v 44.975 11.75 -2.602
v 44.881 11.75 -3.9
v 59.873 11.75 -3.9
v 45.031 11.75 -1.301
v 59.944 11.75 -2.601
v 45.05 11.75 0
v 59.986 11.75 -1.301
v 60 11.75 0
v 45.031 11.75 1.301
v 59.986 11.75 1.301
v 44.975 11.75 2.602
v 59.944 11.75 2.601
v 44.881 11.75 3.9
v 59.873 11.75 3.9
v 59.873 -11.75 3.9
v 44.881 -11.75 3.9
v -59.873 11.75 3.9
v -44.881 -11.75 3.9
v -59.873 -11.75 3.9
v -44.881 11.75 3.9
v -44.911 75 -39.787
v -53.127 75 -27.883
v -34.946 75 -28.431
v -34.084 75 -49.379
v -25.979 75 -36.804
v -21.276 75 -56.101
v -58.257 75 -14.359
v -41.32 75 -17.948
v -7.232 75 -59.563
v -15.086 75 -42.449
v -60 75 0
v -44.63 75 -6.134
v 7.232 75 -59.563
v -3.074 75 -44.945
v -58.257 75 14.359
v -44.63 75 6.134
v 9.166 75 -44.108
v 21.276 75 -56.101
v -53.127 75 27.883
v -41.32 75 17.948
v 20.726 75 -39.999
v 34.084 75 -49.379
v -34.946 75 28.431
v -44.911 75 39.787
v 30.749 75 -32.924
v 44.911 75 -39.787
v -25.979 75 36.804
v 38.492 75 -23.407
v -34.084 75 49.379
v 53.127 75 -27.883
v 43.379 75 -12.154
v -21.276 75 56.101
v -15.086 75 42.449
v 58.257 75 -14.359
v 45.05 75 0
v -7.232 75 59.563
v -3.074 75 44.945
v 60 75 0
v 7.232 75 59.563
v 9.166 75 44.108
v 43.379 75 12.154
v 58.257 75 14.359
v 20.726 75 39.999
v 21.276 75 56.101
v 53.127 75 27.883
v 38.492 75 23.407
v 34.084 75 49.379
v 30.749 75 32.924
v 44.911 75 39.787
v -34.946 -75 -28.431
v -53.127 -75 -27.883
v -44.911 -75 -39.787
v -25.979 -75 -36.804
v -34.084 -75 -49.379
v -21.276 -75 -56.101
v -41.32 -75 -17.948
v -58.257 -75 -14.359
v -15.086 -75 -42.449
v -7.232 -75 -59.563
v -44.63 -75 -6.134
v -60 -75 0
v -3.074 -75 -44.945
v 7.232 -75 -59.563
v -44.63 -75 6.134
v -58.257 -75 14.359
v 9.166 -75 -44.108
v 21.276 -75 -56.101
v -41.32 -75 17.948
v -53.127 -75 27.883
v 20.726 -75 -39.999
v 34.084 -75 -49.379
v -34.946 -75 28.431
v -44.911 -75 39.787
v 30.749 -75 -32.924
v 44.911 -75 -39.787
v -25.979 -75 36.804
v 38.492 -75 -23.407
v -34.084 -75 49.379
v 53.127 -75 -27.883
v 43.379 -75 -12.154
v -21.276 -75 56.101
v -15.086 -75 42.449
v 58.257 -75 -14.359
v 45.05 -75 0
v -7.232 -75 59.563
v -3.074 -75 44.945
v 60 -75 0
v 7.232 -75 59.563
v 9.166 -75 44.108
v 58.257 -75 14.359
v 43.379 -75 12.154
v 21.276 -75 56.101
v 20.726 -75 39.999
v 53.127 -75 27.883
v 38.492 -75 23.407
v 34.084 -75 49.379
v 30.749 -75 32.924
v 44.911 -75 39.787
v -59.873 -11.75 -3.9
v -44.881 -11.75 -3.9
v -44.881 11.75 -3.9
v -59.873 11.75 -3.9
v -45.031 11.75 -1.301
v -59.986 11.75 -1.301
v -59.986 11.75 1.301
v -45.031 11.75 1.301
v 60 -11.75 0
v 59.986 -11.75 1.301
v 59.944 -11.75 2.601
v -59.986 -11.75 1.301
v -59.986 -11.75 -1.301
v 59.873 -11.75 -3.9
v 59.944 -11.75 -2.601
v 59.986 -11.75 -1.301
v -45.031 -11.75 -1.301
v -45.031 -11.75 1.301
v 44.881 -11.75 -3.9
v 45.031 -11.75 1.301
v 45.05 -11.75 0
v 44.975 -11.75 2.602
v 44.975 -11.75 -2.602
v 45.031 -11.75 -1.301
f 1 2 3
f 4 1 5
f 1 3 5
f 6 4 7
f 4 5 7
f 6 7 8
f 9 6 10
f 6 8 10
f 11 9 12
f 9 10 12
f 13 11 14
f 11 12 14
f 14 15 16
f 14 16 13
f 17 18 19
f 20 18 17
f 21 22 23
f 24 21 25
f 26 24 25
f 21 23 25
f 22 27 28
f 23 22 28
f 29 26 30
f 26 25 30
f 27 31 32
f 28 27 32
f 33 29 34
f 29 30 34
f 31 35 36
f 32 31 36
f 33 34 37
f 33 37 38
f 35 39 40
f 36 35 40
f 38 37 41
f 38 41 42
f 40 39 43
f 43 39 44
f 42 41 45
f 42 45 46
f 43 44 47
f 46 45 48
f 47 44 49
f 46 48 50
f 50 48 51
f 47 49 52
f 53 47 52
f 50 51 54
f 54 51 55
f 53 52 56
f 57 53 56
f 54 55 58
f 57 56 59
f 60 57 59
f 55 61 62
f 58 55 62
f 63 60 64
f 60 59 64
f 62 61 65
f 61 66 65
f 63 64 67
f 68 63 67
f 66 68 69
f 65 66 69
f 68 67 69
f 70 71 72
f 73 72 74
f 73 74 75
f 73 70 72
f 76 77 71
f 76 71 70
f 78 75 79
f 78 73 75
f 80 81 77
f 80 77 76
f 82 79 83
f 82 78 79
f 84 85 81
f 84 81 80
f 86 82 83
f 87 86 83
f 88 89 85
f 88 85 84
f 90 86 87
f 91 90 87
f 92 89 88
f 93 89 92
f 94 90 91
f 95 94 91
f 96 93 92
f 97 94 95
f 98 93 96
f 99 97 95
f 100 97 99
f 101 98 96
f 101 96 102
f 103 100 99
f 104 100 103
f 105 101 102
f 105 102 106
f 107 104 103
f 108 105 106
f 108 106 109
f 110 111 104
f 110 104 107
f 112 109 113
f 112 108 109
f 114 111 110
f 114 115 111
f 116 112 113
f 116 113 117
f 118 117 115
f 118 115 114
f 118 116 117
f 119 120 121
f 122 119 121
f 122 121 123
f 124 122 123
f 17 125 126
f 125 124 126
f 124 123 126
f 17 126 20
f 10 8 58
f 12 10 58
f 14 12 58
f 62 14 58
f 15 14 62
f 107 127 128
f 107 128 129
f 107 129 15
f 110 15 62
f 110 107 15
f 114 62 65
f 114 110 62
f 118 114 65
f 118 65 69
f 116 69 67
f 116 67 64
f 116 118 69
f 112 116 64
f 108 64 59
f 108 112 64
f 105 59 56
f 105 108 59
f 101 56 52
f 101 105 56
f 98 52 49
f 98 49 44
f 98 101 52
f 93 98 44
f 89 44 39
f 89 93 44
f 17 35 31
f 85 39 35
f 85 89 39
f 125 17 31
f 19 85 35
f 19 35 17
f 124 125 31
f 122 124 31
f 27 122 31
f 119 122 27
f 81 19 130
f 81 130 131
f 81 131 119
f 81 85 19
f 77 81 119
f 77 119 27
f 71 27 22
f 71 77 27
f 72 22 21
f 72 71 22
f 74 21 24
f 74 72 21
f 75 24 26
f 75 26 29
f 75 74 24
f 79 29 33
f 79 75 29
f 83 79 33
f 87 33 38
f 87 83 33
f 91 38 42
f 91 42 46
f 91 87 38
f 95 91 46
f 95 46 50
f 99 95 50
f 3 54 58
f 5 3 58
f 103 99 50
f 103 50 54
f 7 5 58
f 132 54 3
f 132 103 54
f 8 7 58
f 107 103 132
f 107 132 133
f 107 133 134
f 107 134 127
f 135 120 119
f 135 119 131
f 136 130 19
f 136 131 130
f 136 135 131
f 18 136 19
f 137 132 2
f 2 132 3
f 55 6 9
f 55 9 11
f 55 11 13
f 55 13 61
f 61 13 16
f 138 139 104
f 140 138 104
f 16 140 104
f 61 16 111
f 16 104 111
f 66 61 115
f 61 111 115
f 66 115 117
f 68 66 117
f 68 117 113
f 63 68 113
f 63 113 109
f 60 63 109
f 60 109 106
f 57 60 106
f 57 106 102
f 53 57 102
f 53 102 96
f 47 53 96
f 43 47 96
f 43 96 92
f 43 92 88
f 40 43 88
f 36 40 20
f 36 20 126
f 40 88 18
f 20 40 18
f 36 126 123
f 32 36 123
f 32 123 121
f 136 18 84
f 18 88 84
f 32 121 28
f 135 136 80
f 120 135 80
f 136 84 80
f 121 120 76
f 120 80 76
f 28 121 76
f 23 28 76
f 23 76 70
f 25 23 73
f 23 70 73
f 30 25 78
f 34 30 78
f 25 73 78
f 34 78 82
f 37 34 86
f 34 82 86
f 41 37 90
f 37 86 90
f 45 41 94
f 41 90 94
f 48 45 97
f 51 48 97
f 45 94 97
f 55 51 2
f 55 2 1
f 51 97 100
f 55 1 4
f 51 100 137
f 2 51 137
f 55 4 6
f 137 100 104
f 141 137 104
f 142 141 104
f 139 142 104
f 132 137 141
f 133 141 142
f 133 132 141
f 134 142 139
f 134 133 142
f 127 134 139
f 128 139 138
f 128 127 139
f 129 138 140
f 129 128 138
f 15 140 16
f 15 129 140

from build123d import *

# Parameters (mm, degrees)
F0_R     = 60
F1_DEPTH = 75
F2_R     = 45.05
F3_DEPTH = 300
F4_W     = 23.5
F4_H     = 7.8
F5_DEPTH = 78.9


with BuildPart() as f1:
    # F0 (on Front) → F1 (new body, symmetric)
    with BuildSketch(Plane.XZ):
        Circle(F0_R)
    extrude(amount=F1_DEPTH, both=True)

    # F2 (on face) → F3 (cut)
    with BuildSketch(Plane.XZ.offset(75)):
        Circle(F2_R)
    extrude(amount=-F3_DEPTH, mode=Mode.SUBTRACT)

    # F4 (on Right) → F5 (cut, symmetric)
    with BuildSketch(Plane.YZ):
        Rectangle(F4_W, F4_H)
    extrude(amount=F5_DEPTH, both=True, mode=Mode.SUBTRACT)


solid = f1.part
